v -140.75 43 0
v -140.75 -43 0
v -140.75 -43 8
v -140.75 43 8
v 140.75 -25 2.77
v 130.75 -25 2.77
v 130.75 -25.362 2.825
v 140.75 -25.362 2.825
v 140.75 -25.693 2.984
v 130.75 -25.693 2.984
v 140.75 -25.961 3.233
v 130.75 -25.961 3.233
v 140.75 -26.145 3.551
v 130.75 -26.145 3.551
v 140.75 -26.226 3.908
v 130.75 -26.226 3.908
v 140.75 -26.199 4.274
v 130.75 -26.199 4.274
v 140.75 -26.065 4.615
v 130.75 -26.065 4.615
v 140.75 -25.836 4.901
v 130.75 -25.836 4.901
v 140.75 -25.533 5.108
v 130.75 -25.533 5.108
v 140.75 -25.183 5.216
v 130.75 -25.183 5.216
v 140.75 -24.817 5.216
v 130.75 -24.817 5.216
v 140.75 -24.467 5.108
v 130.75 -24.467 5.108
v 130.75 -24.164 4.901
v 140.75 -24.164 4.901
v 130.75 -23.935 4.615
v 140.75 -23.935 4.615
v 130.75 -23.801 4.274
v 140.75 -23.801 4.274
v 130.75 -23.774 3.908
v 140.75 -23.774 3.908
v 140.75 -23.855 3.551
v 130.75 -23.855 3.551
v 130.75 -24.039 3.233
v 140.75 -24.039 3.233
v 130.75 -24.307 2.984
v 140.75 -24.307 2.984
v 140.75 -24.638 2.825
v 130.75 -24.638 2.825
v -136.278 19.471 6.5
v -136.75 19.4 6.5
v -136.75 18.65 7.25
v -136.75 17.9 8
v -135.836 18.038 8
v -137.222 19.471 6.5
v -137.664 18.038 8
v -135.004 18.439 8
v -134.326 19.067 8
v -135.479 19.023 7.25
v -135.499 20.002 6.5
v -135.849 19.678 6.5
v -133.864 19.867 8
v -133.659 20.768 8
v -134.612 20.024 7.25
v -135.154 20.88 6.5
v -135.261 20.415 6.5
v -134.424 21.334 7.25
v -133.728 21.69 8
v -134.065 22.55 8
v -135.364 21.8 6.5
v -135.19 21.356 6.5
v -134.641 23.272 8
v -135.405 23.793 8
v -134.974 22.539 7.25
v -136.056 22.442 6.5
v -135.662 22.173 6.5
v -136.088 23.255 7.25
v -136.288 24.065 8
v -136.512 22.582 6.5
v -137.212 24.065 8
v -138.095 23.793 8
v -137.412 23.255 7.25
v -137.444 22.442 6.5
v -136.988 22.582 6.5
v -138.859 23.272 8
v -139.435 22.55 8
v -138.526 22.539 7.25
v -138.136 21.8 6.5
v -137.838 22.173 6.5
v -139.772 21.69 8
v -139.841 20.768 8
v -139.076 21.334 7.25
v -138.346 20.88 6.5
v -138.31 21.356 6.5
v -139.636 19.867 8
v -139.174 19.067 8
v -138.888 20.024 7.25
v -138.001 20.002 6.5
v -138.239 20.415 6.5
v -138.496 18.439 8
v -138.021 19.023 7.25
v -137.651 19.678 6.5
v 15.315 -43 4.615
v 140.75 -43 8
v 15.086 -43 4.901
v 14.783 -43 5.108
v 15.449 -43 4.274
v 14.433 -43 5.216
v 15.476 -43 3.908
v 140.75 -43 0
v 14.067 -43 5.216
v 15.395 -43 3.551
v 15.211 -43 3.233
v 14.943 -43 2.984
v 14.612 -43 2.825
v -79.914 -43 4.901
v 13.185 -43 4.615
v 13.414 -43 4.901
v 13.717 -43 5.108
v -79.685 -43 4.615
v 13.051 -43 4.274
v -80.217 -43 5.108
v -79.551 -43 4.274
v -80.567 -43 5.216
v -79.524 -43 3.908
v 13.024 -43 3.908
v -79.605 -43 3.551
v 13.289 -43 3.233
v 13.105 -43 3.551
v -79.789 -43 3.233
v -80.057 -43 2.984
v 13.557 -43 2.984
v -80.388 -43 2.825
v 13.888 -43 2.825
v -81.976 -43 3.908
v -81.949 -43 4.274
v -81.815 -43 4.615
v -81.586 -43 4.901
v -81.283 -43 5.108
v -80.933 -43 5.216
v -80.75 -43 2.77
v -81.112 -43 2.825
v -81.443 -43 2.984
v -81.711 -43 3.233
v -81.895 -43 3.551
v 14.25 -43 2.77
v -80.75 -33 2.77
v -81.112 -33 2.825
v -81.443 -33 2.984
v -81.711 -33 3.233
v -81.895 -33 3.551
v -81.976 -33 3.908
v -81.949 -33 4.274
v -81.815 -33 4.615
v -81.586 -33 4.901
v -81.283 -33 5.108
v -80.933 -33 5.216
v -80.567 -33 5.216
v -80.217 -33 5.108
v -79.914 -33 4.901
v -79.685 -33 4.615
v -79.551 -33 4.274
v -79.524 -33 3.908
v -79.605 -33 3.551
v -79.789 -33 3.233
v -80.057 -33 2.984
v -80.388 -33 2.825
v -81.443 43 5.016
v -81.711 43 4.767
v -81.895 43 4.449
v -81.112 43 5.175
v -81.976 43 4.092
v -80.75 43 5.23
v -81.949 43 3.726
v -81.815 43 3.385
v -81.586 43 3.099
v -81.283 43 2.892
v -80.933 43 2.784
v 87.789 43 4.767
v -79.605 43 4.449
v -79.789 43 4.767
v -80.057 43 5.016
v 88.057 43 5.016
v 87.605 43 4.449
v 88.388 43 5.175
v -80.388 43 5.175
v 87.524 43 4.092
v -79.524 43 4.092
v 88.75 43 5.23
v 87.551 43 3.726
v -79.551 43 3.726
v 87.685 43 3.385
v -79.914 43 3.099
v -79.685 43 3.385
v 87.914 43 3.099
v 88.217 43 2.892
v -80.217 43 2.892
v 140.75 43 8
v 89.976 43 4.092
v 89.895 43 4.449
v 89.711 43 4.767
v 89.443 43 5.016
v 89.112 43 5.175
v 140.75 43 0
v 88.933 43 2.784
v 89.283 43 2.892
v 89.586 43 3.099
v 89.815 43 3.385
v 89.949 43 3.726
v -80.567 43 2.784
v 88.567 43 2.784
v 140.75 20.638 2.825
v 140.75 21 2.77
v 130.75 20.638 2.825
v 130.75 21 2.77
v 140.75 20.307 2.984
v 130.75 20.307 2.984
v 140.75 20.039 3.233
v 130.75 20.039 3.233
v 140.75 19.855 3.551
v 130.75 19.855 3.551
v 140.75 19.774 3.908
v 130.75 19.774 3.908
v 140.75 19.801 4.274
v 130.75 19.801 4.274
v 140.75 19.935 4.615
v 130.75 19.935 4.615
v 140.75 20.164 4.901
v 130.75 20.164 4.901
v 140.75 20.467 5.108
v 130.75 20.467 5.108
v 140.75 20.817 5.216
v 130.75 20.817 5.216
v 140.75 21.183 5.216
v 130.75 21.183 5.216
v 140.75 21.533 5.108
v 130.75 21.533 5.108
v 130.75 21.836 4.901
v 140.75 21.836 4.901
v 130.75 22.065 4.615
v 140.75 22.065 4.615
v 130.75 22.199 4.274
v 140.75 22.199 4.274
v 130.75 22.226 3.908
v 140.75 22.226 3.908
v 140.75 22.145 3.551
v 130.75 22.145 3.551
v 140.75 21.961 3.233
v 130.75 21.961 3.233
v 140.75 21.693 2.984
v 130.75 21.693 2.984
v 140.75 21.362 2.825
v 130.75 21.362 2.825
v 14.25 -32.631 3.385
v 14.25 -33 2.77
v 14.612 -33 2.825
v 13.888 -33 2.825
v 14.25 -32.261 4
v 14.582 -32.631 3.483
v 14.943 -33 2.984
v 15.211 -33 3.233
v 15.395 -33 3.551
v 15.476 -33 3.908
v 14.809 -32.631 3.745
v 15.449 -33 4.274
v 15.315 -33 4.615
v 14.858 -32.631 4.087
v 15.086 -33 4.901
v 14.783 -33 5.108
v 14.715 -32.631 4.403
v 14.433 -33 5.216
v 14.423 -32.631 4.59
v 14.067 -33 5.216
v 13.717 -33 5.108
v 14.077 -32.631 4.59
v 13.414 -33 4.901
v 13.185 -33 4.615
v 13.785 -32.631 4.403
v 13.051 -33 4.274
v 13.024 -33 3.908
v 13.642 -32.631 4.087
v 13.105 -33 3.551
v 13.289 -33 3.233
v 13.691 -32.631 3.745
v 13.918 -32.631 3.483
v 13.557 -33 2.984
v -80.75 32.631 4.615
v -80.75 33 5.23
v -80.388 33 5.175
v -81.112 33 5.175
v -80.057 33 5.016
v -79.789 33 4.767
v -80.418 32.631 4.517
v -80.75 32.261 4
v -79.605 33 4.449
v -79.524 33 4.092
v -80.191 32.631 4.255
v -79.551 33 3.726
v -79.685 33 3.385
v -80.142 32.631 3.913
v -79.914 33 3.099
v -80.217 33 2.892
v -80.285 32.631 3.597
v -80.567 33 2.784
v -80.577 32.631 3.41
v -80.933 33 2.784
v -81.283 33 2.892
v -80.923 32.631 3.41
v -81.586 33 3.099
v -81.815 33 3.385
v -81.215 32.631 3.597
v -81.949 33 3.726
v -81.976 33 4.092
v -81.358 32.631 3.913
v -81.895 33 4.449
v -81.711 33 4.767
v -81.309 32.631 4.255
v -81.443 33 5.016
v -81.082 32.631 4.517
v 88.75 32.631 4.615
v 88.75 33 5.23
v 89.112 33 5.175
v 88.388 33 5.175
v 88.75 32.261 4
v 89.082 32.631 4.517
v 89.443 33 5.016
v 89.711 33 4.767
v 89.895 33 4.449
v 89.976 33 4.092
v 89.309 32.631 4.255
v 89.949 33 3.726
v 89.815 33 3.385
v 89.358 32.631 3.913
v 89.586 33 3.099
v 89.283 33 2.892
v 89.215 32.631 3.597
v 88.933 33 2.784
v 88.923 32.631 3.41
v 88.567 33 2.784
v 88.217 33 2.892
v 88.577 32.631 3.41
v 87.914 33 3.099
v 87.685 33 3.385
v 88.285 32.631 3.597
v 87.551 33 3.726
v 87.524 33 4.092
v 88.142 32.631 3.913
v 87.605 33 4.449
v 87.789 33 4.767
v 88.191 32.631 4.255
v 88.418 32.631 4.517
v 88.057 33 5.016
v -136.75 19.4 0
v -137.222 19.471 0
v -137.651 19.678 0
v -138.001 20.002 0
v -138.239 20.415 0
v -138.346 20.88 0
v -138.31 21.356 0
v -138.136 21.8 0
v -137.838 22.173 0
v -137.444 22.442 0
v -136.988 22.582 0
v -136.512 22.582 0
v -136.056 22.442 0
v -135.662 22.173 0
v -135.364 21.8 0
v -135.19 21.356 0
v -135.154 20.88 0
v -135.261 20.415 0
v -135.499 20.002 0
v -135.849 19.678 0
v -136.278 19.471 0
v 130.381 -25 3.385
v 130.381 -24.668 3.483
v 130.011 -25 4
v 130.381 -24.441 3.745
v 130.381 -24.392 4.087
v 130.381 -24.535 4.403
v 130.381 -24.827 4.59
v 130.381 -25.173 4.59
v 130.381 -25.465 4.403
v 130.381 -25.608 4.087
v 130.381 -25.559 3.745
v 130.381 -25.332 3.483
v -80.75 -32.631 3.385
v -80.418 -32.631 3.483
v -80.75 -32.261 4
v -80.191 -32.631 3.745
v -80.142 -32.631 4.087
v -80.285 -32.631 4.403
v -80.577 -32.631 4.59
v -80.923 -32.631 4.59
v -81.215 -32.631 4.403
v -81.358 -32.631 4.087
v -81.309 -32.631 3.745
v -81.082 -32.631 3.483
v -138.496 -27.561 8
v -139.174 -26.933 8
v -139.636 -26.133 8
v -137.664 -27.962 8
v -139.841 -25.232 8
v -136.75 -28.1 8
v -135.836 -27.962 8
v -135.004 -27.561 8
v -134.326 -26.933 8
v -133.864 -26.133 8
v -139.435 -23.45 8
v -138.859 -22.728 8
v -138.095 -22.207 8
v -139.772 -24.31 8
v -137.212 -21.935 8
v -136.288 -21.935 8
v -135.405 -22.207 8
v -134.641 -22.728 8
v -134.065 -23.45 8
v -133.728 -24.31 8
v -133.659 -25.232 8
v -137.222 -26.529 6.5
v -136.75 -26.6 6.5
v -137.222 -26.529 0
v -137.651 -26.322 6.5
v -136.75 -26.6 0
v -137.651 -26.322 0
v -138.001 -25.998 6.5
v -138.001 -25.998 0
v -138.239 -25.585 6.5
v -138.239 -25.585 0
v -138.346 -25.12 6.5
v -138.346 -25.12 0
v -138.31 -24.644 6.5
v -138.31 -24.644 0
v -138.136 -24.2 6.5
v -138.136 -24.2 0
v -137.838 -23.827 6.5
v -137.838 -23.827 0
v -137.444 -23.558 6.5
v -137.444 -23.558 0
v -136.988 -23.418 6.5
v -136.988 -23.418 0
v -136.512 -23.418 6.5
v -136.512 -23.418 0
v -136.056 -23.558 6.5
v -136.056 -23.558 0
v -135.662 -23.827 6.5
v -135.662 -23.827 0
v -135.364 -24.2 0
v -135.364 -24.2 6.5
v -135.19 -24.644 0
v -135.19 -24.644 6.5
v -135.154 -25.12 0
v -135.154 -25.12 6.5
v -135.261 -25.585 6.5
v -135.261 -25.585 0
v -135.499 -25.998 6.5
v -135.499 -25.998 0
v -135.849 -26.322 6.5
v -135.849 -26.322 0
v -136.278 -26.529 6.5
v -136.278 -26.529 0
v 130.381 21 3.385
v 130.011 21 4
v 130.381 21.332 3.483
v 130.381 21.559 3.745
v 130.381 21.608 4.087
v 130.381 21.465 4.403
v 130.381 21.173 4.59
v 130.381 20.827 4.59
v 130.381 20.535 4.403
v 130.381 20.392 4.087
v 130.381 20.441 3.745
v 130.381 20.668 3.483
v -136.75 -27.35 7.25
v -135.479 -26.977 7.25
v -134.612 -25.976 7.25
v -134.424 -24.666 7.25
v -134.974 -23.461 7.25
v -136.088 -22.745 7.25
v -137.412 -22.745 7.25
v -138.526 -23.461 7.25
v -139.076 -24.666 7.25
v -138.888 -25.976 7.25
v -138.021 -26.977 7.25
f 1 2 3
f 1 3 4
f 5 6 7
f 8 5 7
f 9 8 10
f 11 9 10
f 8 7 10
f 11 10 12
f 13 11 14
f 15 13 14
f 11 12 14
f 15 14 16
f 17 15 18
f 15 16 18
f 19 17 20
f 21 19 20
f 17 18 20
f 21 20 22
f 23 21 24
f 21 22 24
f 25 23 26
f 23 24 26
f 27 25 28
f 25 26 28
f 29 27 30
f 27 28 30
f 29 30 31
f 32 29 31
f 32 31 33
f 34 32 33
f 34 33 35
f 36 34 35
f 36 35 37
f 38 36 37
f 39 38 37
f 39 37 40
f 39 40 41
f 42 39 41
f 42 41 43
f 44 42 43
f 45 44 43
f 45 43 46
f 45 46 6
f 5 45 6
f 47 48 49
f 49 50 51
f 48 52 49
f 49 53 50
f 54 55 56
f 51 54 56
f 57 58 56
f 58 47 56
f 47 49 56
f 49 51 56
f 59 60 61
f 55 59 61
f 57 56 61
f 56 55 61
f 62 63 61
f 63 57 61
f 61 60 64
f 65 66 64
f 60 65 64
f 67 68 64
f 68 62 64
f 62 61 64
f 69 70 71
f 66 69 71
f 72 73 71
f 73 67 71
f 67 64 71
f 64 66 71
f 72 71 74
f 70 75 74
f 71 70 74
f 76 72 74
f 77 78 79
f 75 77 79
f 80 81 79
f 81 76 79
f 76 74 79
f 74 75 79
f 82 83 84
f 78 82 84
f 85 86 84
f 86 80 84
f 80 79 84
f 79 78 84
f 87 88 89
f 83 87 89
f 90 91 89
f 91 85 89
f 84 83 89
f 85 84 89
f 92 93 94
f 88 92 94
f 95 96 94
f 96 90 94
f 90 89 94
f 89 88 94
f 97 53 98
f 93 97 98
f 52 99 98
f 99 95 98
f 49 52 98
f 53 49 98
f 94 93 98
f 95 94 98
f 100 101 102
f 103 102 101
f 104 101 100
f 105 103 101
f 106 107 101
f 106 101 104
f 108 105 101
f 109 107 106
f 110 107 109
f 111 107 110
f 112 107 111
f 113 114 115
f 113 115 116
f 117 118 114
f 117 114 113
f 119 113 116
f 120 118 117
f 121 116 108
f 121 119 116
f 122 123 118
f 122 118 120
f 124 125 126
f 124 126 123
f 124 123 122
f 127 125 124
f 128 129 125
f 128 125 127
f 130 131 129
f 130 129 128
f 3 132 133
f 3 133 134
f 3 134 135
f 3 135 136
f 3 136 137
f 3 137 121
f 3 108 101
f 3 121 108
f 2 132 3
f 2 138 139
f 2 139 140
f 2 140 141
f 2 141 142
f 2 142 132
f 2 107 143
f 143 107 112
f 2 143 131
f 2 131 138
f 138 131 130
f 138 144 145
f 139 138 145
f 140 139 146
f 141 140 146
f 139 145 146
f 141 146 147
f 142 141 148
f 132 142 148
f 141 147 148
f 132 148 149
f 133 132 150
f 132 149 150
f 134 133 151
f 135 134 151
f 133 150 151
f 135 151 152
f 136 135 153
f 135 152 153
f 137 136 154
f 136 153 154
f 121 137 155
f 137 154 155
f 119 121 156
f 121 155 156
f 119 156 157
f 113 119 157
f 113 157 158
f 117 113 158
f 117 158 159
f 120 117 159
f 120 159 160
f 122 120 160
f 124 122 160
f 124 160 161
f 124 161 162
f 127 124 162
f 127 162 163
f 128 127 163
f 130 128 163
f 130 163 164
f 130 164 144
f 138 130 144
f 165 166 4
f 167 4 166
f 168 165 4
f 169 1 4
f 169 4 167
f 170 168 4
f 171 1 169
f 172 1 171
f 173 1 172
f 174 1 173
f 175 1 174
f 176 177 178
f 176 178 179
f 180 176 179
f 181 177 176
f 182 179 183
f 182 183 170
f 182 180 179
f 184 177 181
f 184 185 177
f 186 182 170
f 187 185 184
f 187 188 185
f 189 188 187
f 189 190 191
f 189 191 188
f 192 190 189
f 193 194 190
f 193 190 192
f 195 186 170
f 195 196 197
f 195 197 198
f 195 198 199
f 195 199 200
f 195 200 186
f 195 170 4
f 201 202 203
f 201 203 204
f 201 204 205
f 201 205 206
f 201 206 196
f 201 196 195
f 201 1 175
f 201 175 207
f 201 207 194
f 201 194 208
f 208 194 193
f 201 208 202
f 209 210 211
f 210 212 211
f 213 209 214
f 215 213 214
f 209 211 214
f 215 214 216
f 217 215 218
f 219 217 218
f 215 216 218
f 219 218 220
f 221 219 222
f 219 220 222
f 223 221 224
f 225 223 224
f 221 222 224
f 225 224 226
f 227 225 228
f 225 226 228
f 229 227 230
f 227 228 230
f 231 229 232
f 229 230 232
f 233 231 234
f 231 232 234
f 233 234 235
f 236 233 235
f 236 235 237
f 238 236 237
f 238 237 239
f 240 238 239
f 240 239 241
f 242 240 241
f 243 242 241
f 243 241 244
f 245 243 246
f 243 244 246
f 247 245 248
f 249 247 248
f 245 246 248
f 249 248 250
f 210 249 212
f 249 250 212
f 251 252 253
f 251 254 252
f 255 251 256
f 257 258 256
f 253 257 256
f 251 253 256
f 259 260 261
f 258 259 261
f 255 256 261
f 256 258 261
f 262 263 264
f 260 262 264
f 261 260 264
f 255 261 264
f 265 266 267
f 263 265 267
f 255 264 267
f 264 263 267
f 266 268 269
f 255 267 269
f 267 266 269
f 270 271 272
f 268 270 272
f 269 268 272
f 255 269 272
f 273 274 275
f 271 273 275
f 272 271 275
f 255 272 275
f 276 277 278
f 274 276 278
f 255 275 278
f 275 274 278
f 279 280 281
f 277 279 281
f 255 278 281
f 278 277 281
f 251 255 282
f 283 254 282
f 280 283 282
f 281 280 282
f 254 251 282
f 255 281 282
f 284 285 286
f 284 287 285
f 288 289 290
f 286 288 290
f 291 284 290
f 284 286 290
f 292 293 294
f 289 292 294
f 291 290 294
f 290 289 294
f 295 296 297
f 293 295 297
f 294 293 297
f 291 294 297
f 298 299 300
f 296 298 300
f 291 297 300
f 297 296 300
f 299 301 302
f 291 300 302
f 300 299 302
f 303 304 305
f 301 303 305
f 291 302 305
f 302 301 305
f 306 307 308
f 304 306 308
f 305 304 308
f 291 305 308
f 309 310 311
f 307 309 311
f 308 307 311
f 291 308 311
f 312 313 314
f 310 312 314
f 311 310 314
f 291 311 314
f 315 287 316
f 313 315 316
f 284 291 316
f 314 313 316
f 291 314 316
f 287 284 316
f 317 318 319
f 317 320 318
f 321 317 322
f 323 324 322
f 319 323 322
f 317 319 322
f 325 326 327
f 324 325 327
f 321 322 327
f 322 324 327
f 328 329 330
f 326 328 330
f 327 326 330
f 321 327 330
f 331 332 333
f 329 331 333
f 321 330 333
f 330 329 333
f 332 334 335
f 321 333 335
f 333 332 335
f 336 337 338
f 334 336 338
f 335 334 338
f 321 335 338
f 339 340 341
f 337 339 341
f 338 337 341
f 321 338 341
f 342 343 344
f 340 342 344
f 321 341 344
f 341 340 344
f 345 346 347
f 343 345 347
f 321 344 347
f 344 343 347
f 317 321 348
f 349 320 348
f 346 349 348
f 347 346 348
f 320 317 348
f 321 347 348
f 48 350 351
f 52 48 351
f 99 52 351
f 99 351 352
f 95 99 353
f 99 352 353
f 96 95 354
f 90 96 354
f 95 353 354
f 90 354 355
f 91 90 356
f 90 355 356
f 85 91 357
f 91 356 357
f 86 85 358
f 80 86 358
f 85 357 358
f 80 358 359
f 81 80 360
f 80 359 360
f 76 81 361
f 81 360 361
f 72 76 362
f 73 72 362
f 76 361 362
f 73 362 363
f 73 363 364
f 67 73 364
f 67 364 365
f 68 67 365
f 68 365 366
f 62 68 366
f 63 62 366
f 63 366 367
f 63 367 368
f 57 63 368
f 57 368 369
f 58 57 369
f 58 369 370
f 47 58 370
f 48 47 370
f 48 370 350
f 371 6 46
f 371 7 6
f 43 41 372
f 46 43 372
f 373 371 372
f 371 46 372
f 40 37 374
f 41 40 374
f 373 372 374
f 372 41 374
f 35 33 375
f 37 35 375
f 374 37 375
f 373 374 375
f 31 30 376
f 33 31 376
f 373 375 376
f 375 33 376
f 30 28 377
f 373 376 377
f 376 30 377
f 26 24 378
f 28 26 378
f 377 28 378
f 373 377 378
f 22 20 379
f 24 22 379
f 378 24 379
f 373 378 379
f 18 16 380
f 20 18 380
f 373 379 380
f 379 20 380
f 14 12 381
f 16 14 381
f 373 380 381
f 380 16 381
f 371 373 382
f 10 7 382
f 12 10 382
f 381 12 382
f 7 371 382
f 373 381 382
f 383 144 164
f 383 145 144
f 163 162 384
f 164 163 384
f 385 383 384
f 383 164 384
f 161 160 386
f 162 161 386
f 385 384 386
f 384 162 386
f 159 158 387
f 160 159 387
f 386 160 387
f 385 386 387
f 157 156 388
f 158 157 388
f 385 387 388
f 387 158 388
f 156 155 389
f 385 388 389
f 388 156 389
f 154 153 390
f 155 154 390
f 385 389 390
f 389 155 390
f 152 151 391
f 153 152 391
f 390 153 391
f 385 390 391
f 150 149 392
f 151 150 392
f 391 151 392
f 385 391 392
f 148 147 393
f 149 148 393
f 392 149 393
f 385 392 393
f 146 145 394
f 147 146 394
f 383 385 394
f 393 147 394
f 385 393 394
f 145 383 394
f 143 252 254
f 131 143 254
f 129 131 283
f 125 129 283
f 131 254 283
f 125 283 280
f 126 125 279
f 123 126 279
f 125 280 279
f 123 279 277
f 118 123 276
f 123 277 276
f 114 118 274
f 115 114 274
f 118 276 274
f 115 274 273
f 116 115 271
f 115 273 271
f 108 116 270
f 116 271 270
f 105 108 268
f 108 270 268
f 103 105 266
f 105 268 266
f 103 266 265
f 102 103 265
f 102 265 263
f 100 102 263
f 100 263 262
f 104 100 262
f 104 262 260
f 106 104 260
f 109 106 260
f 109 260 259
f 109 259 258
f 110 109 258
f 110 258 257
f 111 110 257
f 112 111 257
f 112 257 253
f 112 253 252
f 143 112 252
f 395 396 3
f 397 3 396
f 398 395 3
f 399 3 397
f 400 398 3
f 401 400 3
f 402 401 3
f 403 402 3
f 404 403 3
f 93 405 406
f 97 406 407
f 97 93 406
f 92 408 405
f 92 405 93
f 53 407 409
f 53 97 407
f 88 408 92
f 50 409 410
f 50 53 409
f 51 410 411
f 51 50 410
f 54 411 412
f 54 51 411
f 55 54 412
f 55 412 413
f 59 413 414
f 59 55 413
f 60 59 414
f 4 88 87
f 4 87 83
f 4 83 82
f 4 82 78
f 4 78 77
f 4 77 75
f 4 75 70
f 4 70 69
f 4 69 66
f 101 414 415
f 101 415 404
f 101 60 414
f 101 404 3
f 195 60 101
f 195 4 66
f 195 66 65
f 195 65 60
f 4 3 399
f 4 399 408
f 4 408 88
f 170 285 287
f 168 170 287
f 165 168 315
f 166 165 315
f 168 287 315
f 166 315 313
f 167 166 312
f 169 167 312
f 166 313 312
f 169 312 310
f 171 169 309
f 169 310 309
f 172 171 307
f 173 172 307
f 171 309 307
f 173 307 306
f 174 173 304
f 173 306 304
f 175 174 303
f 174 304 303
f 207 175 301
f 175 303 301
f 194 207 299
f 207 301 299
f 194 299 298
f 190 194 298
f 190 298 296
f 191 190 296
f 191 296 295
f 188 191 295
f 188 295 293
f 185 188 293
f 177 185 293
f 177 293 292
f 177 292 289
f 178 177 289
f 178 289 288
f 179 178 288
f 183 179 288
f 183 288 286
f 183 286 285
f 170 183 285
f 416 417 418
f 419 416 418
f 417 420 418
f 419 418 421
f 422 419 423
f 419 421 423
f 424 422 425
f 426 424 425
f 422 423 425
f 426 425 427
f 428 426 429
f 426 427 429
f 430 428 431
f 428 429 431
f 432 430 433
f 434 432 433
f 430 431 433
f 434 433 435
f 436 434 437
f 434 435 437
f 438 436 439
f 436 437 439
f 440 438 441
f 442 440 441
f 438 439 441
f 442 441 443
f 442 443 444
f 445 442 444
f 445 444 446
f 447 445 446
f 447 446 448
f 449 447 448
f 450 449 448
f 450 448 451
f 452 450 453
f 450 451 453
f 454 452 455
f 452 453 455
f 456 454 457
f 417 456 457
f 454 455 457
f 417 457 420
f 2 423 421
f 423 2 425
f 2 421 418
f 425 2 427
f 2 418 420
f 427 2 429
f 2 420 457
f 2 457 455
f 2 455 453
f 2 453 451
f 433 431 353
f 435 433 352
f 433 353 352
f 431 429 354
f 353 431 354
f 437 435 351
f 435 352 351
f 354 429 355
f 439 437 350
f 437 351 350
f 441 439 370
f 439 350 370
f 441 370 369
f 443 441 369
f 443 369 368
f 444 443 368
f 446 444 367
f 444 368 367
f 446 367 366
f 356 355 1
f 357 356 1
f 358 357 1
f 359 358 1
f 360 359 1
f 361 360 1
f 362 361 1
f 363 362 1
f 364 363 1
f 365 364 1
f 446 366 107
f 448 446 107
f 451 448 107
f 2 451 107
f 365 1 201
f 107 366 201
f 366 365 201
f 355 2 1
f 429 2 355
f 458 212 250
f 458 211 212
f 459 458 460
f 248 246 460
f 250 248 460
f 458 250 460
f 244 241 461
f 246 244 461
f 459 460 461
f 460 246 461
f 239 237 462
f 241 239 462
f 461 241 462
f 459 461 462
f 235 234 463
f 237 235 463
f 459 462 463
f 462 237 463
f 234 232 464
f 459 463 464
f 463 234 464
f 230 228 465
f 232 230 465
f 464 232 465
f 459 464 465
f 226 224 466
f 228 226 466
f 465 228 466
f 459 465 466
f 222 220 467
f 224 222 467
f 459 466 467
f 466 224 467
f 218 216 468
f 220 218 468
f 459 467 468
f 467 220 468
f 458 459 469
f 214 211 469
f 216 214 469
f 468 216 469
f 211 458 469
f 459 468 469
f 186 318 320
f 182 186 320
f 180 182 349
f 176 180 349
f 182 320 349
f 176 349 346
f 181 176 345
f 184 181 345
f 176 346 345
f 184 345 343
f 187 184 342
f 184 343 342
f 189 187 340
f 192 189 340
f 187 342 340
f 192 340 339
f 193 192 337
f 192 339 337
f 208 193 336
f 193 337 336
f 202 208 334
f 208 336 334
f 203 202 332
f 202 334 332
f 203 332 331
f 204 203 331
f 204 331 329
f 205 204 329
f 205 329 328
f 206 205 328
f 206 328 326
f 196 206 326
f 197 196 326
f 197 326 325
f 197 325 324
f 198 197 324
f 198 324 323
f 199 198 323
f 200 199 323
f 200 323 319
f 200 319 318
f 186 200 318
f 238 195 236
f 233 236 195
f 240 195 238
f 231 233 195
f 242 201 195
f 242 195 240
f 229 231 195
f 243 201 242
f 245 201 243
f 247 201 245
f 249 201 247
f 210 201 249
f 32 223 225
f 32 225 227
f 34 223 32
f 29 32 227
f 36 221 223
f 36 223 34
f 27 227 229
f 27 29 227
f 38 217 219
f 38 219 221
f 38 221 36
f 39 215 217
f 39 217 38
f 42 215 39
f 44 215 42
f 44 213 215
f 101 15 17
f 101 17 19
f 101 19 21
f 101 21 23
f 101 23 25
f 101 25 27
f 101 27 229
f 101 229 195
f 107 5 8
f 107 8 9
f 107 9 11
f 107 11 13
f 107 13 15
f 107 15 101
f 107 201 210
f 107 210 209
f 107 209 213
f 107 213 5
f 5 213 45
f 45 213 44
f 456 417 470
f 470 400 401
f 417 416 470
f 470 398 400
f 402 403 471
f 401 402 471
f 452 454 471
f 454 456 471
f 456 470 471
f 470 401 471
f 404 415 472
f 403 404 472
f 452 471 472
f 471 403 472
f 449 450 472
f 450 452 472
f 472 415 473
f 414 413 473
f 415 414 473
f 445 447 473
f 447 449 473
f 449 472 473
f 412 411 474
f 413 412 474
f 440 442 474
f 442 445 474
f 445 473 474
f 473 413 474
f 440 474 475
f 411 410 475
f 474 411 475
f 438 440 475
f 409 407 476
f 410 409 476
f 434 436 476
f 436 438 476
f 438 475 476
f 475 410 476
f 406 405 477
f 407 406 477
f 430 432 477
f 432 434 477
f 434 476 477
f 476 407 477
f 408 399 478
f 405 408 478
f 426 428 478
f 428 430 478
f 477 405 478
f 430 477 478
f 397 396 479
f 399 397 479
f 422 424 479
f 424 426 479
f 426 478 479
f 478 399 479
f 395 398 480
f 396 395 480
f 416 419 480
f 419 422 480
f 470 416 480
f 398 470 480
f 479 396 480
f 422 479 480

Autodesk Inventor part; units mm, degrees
ref_plane "YZ Plane" through (0, 0, 0) normal (1, 0, 0) x (0, 1, 0)
ref_plane "XZ Plane" through (0, 0, 0) normal (0, 1, 0) x (-1, 0, 0)
ref_plane "XY Plane" through (0, 0, 0) normal (0, 0, 1) x (1, 0, 0)
sketch "Skizze1" plane through (0, 0, 0) normal (0, 0, 1) x (1, 0, 0)
  line L0 (-140.75, 43) -> (140.75, 43)
  line L1 (140.75, 43) -> (140.75, -43)
  line L2 (140.75, -43) -> (-140.75, -43)
  line L3 (-140.75, -43) -> (-140.75, 43)
  line L4 (0, 60.2) -> (0, -60.2) projected
  line L5 (-197.05, 0) -> (197.05, 0) projected
  point P0 (0, 0)
  point P1 (0, 43)
  point P2 (-140.75, 0)
  dimension "d0" = 281.5
  dimension "d1" = 86
extrude "Extrusion1" add sketch "Skizze1" along normal blind 8
sketch "Skizze2" plane through (-140.75, 43, 0) normal (0, 1, 0) x (1, 0, 0)
  circle A0 centre (285.5, 42) radius 3.1 projected
  circle A1 centre (60, -4) radius 3.1 projected
  circle A2 centre (229.5, -4) radius 3.1 projected
  circle A3 centre (4, 42) radius 3.1 projected
  circle A4 centre (285.5, 142) radius 3.1 projected
  circle A5 centre (4, 142) radius 3.1 projected
  circle A6 centre (229.5, 188) radius 3.1 projected
  circle A7 centre (60, 188) radius 3.1 projected
  line L0 (0, -8) -> (0, 192) projected
  line L1 (0, -8) -> (289.5, -8) projected
  line L2 (289.5, -8) -> (289.5, 69) projected
  line L3 (289.5, 69) -> (341.5, 69) projected
  line L4 (341.5, 69) -> (341.5, 115) projected
  line L5 (289.5, 115) -> (341.5, 115) projected
  line L6 (289.5, 192) -> (289.5, 115) projected
  line L7 (0, 192) -> (289.5, 192) projected
  point P0 (140.75, 0)
hole "Bohrung1" at (-80.75, 43, 4) at (88.75, 43, 4) direction (0, -1, 0) diameter 2.459 depth 10 tip angle 118 thread size "M3x0.5" class "6H" standard "ISO Metric profile"
sketch "Skizze3" plane through (140.75, -43, 0) normal (1, 0, 0) x (0, 0, -1)
  circle A0 centre (-4, 18) radius 3.15 projected
  circle A1 centre (-4, 64) radius 3.15 projected
  line L0 (69, 18.5) -> (69, 86) projected
  line L1 (-8, 86) -> (69, 86) projected
  line L2 (-8, -4) -> (-8, 86) projected
  line L3 (87.2303, -4) -> (-8, -4) projected
  arc A2 (69, 18.5) -> (87.2303, -4) centre (92, 18.5) ccw projected
  point P0 (0, 43)
hole "Bohrung2" at (140.75, -25, 4) at (140.75, 21, 4) direction (-1, 0, 0) diameter 2.459 depth 10 tip angle 118 thread size "M3x0.5" class "6H" standard "ISO Metric profile"
sketch "Skizze4" plane through (0, 0, 8) normal (0, 0, 1) x (1, 0, 0)
  line L0 (-140.75, 43) -> (140.75, 43) projected
  line L1 (-140.75, -43) -> (-140.75, 43) projected
  line L2 (140.75, -43) -> (-140.75, -43) projected
  point P0 (0, 0)
  point P1 (-136.75, 21)
  point P2 (-136.75, -25)
  dimension "d18" = 4
  dimension "d19" = 22
  dimension "d20" = 4
  dimension "d21" = 18
hole "Bohrung3" at (-136.75, 21, 8) at (-136.75, -25, 8) direction (0, 0, -1) diameter 3.2 end through all countersink diameter 6.2 countersink angle 90
sketch "Skizze5" plane through (-140.75, -43, 0) normal (0, -1, 0) x (1, 0, 0)
  circle A0 centre (60, 4) radius 3.1 projected
  circle A1 centre (155, 4) radius 3.1 projected
  point P0 (140.75, 0)
hole "Bohrung4" at (-80.75, -43, 4) at (14.25, -43, 4) direction (0, 1, 0) diameter 2.459 depth 10 tip angle 118 thread size "M3x0.5" class "6H" standard "ISO Metric profile"
equation "\"d20\" = d18"
properties part number "Wand4" material "Polycarbonate, Smoke"
